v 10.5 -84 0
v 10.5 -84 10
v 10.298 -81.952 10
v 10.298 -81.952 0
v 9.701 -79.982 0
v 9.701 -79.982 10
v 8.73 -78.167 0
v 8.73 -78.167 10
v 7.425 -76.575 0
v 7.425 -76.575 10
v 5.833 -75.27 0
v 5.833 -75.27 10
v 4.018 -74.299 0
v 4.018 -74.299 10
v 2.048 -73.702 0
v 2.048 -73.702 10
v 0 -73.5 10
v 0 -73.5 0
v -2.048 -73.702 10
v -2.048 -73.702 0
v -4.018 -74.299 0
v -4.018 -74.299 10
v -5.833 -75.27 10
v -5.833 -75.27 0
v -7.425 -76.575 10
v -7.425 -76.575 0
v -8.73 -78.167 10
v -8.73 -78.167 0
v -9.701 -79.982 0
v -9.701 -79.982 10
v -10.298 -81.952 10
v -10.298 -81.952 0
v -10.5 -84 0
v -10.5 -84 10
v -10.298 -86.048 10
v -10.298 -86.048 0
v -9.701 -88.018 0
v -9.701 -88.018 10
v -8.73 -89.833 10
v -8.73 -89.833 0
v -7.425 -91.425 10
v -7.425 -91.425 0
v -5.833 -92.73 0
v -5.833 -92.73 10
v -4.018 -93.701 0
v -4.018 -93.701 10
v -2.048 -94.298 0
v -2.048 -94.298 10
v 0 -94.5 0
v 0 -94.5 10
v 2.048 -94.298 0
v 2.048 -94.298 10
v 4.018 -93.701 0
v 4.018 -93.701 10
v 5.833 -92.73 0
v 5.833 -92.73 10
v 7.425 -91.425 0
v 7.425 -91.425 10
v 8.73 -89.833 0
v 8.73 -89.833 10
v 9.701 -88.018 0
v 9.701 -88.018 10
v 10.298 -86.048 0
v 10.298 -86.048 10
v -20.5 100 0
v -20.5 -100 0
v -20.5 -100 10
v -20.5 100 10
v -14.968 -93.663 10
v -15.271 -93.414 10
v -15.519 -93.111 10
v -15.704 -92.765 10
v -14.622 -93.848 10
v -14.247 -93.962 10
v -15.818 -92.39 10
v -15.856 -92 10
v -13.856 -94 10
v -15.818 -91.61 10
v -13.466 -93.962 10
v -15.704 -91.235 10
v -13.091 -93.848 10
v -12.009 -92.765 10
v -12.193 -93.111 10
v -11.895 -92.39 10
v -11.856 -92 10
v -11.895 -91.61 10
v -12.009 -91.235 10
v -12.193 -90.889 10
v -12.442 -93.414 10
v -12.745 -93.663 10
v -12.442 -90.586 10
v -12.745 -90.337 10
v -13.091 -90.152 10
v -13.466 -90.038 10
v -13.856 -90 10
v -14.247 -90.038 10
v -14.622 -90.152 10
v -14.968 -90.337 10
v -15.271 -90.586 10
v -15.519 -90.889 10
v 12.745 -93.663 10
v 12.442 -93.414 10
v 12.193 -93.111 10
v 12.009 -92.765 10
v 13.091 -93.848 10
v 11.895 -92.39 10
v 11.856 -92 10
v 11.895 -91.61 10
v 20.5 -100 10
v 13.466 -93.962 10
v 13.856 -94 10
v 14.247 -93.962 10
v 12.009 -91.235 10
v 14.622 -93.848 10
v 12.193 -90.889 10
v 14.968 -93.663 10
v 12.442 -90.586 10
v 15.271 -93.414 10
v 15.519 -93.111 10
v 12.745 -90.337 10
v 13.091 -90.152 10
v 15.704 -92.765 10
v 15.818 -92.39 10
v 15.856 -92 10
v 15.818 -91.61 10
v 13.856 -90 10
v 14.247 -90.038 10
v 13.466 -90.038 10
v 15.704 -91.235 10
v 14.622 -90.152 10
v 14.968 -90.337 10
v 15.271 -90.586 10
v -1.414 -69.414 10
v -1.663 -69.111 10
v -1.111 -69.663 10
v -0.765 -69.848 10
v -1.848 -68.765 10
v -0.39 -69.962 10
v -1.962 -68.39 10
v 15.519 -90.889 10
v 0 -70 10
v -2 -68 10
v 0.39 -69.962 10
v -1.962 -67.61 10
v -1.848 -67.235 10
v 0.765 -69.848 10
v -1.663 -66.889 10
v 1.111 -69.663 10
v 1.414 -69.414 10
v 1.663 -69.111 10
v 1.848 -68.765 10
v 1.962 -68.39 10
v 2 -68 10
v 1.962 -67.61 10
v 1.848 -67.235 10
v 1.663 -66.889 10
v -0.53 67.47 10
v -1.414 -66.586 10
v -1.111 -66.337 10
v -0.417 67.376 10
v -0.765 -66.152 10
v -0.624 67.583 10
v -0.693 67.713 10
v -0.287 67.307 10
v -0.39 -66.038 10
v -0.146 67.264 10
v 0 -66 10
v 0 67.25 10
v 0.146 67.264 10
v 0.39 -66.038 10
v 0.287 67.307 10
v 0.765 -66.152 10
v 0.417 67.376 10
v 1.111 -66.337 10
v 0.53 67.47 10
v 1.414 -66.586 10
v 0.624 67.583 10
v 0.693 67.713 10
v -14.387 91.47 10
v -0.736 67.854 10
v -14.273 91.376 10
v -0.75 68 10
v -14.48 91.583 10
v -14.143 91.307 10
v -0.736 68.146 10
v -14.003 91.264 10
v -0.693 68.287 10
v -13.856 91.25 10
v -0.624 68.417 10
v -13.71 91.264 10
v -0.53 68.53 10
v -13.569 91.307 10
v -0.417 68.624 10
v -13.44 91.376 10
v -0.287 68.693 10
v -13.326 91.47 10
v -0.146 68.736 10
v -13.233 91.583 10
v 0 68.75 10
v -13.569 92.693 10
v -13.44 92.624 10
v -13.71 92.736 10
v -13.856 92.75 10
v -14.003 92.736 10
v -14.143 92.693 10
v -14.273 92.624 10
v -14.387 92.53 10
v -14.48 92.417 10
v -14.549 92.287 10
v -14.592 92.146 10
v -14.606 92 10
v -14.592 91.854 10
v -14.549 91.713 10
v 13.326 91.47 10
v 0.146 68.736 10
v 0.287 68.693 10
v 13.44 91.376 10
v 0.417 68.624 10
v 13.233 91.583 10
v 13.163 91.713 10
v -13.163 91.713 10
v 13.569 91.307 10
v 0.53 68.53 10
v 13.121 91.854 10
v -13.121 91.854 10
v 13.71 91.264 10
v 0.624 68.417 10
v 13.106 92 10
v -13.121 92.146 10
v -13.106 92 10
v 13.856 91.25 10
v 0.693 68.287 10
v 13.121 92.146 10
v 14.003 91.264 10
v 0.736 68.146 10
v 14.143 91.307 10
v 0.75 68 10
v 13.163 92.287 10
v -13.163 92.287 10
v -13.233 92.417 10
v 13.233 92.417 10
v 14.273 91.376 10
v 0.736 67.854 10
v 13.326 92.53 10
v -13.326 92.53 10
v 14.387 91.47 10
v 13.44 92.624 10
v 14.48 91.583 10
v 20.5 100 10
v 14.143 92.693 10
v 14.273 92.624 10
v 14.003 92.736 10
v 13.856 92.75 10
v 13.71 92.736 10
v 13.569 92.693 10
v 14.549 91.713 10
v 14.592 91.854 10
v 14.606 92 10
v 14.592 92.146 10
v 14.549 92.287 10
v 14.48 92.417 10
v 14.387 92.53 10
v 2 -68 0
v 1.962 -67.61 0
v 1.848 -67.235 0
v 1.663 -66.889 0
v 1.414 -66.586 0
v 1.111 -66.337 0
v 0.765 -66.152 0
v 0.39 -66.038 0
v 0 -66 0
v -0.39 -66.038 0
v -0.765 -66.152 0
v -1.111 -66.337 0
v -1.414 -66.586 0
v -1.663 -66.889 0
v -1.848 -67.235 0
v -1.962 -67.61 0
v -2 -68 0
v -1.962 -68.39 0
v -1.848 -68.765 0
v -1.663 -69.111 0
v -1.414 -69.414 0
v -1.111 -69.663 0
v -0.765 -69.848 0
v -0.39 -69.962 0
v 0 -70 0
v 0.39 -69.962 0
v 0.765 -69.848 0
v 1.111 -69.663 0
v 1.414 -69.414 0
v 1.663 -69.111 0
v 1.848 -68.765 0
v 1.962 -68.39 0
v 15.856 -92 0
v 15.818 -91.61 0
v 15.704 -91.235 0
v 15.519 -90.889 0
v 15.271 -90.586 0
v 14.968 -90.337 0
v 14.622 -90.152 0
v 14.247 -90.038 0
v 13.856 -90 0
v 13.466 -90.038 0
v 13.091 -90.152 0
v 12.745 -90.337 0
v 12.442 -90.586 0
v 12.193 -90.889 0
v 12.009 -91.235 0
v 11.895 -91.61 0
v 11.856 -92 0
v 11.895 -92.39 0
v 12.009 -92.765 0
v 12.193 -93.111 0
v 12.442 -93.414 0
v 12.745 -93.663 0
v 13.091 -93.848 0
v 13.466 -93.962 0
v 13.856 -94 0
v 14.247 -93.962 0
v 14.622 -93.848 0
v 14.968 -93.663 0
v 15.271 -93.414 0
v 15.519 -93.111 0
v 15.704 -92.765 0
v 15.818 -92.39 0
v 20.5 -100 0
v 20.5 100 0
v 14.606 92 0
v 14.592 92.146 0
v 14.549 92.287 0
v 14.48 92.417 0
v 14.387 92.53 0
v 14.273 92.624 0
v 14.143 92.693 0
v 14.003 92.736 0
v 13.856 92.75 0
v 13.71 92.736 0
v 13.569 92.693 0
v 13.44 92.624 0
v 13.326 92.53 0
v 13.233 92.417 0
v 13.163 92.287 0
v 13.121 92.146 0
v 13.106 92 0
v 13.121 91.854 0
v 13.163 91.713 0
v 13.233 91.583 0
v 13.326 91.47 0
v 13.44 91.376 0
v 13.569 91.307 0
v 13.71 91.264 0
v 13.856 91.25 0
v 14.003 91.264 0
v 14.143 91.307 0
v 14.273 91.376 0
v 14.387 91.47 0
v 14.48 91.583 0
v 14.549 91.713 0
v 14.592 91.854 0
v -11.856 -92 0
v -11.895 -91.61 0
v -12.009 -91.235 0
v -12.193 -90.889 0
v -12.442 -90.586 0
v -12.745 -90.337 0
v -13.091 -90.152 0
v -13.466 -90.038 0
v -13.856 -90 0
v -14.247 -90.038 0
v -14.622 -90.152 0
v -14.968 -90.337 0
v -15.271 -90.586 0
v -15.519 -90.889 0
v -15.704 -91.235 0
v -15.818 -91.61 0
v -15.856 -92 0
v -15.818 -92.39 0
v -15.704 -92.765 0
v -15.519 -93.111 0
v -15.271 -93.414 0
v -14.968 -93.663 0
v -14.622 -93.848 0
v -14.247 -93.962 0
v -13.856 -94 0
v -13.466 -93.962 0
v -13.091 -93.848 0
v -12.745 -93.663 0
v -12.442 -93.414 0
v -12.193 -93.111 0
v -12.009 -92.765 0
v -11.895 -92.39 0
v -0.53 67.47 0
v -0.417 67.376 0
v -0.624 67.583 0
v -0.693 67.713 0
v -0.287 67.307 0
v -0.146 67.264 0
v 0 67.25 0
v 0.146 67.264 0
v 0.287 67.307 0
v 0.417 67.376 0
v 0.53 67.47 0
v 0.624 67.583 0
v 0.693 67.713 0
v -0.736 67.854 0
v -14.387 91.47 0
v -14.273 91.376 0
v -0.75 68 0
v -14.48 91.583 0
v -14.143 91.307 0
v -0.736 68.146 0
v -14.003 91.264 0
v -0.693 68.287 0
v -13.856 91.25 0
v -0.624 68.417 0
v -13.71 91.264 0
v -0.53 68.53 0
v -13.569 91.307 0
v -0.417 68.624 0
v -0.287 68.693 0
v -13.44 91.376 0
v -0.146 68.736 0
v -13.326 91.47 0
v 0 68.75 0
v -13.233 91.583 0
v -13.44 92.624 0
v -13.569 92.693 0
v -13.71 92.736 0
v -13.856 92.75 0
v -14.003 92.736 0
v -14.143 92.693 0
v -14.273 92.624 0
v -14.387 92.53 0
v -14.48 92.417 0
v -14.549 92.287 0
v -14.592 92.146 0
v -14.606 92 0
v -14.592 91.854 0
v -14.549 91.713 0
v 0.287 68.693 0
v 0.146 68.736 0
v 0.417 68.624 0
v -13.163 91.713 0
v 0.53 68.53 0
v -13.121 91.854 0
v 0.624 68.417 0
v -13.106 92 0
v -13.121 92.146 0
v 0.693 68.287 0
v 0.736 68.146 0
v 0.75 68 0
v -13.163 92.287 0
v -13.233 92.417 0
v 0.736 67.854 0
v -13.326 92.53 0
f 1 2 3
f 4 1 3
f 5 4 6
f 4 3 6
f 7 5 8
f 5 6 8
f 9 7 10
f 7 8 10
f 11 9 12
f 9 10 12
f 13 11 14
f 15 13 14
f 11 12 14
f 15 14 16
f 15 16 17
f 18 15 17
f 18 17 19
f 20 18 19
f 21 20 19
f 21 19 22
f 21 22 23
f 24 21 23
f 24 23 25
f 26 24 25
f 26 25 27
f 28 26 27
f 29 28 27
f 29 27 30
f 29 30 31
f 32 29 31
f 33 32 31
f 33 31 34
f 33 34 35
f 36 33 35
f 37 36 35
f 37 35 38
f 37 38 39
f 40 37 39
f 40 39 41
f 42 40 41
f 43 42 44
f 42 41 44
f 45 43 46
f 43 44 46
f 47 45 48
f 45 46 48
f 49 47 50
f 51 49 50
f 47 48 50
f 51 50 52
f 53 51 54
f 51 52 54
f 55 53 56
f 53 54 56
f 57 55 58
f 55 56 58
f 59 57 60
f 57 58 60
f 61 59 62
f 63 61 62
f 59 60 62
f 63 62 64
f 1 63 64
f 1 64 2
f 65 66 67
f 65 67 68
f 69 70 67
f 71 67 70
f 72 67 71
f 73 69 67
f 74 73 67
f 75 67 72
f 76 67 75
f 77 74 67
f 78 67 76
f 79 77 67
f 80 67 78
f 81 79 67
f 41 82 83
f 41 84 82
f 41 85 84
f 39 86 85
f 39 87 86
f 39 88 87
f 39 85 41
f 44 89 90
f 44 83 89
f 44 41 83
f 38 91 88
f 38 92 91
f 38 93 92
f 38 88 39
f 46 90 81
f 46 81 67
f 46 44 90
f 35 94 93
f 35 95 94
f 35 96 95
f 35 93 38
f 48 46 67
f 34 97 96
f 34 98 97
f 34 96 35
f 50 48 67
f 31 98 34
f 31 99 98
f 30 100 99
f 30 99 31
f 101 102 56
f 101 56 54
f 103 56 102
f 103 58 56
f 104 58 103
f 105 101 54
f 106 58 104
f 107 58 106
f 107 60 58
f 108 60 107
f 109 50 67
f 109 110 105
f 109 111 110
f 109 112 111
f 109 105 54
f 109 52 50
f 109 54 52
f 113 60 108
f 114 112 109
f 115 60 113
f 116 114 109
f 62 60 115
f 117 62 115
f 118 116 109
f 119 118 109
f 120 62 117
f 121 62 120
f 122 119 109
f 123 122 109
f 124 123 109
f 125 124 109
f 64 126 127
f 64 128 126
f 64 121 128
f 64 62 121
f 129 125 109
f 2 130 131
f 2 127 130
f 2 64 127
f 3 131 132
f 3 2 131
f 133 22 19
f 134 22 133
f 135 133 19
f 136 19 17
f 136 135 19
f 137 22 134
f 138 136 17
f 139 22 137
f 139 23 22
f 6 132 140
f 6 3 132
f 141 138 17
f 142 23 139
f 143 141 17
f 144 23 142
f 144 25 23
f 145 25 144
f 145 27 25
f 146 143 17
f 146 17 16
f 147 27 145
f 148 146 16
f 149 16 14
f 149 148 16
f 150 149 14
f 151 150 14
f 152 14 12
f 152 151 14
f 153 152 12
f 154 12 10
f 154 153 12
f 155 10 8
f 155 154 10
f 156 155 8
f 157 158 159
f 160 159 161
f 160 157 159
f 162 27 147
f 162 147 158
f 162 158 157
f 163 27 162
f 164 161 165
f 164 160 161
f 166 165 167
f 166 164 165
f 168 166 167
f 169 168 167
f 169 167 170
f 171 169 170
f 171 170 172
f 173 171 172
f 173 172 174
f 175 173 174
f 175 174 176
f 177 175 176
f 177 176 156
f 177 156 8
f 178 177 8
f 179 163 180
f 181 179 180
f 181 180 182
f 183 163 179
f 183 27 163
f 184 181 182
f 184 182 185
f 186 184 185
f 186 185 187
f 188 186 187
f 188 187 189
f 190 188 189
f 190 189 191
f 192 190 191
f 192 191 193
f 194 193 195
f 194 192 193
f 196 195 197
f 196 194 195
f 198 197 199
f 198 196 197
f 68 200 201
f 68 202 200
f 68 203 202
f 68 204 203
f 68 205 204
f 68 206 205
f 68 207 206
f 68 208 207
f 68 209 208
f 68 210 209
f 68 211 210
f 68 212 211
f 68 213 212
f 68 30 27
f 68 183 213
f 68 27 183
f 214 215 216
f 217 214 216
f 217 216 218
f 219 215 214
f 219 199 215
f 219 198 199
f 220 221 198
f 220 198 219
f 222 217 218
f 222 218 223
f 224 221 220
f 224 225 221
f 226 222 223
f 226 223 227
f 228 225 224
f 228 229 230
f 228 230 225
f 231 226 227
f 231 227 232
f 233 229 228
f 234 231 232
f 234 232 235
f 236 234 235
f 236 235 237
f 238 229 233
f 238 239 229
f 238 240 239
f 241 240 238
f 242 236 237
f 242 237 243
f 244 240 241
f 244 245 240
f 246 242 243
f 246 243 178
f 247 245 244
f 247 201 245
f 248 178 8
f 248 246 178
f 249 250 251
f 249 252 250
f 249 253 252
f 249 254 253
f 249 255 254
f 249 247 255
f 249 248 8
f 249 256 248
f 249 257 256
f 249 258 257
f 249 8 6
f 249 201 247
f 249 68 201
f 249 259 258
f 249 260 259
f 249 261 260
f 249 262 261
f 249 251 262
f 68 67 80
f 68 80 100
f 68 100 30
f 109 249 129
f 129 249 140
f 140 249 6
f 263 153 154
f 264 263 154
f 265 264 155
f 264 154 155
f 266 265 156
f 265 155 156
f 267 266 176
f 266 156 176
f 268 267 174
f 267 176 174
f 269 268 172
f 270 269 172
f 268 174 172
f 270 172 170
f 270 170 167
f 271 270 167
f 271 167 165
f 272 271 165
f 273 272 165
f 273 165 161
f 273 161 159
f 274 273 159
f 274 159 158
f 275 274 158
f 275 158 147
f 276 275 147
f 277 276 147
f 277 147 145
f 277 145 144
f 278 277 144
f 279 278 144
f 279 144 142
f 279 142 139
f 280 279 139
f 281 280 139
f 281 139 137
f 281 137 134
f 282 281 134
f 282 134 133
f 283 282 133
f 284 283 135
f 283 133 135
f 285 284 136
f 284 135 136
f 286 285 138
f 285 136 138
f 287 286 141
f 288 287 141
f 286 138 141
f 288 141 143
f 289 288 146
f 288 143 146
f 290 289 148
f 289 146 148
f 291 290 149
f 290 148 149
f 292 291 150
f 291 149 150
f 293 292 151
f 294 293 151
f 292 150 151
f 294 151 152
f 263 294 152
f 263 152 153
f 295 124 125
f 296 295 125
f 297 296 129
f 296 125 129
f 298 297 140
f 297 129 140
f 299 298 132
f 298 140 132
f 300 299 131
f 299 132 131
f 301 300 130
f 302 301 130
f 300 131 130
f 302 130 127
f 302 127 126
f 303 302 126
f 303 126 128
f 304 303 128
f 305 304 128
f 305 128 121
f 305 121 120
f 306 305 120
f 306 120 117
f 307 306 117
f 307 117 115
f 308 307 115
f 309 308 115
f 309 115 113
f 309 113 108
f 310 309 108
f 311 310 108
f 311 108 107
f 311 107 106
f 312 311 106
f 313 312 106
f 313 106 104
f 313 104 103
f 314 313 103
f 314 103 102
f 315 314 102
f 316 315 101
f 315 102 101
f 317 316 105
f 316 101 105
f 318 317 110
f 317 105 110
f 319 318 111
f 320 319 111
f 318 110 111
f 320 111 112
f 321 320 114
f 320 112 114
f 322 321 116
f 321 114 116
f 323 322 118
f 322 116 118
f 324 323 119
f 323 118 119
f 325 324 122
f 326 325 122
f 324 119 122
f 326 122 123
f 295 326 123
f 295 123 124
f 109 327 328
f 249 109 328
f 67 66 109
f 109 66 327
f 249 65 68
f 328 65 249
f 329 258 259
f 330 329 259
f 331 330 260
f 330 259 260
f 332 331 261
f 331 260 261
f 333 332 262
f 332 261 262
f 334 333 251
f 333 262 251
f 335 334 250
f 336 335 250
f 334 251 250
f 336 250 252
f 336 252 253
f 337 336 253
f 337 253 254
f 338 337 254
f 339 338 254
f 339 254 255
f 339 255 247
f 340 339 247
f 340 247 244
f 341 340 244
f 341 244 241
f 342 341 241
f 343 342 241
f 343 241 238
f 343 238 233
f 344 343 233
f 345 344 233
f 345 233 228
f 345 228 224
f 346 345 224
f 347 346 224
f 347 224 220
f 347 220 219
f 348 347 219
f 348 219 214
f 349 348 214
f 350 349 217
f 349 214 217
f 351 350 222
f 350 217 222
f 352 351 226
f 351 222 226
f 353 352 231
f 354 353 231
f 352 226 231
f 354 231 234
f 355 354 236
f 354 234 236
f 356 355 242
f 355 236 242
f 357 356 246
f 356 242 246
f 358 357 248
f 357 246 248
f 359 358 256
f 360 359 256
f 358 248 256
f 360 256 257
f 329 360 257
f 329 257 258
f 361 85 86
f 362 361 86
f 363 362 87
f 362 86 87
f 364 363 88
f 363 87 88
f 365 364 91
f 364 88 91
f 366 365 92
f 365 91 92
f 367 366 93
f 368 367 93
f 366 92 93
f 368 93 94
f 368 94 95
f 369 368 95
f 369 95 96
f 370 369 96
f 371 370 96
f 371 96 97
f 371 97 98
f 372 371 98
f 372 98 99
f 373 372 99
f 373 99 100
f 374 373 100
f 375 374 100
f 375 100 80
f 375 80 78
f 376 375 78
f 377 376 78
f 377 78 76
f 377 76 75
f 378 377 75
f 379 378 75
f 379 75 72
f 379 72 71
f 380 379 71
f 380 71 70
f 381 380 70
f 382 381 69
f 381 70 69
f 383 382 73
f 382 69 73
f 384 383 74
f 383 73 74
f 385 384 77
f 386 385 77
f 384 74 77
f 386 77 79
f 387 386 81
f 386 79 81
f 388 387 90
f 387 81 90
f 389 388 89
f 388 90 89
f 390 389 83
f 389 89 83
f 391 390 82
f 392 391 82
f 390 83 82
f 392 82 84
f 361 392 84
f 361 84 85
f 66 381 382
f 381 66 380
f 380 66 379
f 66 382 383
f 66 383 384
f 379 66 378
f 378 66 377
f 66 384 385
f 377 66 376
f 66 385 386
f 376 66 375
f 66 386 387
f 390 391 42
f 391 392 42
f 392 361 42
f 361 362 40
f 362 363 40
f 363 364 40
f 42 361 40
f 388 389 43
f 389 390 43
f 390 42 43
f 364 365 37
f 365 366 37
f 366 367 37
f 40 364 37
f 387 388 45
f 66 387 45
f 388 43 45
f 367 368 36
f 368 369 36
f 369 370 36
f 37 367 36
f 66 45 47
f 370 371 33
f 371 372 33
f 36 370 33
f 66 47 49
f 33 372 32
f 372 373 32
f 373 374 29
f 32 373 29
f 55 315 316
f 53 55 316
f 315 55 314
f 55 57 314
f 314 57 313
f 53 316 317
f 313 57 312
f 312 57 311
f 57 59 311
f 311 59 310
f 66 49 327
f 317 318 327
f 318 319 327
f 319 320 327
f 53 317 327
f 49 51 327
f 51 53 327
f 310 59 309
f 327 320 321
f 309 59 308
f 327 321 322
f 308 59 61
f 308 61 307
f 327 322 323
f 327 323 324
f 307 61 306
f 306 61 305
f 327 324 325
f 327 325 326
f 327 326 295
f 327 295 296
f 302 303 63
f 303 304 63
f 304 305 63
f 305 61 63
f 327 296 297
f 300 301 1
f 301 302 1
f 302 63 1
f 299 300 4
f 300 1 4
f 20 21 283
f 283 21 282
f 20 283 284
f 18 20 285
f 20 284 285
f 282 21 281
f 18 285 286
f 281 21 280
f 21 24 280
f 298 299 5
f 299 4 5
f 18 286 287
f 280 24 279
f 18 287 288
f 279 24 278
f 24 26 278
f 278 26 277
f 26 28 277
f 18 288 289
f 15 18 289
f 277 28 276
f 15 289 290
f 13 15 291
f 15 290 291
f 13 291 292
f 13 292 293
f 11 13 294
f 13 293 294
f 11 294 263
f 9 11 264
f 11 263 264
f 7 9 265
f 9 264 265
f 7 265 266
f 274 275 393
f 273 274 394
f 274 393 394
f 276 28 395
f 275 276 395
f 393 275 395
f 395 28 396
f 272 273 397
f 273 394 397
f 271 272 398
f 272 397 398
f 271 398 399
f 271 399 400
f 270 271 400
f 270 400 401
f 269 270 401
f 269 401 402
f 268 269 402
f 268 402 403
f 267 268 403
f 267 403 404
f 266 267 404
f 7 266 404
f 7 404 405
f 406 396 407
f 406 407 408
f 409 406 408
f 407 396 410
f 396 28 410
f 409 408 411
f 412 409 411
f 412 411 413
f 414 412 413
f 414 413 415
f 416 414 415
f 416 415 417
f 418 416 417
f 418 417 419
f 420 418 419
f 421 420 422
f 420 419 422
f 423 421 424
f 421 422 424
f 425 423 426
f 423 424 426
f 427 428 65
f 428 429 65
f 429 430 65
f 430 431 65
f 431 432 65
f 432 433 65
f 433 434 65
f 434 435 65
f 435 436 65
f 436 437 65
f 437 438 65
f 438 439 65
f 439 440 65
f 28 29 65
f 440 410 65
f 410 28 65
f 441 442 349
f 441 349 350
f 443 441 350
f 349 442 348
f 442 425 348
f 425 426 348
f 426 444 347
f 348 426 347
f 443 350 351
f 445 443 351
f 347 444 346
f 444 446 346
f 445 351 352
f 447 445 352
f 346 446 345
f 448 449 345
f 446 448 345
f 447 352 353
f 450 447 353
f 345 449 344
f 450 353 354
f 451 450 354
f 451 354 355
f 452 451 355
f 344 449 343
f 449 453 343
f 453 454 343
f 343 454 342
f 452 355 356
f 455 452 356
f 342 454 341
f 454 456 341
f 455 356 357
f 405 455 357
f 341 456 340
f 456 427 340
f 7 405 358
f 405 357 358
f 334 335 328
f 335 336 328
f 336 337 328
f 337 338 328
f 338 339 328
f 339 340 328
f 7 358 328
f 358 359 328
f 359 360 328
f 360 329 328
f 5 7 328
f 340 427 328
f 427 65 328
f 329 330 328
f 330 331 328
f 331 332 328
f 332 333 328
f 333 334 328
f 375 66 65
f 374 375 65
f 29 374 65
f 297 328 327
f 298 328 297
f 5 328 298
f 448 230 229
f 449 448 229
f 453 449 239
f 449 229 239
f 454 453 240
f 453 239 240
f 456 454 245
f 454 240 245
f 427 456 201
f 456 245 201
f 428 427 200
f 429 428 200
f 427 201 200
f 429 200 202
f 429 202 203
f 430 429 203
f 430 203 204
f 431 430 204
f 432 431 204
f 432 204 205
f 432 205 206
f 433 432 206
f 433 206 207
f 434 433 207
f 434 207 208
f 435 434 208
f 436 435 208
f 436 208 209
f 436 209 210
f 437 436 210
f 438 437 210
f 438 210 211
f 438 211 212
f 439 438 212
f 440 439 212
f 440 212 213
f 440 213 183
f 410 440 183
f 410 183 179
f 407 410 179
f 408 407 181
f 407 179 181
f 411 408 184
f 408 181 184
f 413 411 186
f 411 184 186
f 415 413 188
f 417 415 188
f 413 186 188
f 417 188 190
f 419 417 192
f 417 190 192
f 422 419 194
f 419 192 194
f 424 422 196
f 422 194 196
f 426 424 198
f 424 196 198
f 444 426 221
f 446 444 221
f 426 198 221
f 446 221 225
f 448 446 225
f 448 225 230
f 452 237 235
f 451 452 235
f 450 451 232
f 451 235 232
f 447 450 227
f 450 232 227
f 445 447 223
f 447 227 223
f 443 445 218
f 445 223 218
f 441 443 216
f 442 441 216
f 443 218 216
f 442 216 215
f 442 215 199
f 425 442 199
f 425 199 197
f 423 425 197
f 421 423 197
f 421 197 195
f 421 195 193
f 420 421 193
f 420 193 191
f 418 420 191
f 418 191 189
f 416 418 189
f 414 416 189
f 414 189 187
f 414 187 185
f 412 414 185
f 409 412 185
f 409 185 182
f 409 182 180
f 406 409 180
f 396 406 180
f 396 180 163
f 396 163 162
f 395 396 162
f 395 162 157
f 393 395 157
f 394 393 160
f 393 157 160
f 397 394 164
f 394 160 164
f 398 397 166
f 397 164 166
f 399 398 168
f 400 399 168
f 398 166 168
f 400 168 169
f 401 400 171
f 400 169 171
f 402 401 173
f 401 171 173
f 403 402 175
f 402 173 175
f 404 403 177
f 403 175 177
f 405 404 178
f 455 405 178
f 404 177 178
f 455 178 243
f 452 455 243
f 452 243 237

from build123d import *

# Parameters (mm, degrees)
F0_W     = 41
F0_H     = 200
F1_DEPTH = 10
F2_R     = 2
F2_R_2   = 0.75
F2_R_3   = 10.5
F3_DEPTH = 25
F4_DEPTH = 25


with BuildPart() as f1:
    # F0 (on Top) → F1 (new body)
    with BuildSketch(Plane.XY):
        Rectangle(F0_W, F0_H)
    extrude(amount=F1_DEPTH)

    # F2 (on face) → F3 (cut)
    with BuildSketch(Plane.XY.offset(10)):
        with Locations((0, -68)):
            Circle(F2_R)
        with Locations((-13.856406, -92)):
            Circle(F2_R)
        with Locations((13.856406, -92)):
            Circle(F2_R)
        with Locations((0, 68)):
            Circle(F2_R_2)
        with Locations((-13.856406, 92)):
            Circle(F2_R_2)
        with Locations((13.856406, 92)):
            Circle(F2_R_2)
        with Locations((0, -84)):
            Circle(F2_R_3)
    extrude(amount=-F3_DEPTH, mode=Mode.SUBTRACT)

    # F2 (on face) → F4 (cut)
    with BuildSketch(Plane.XY.offset(10)):
        with Locations((0, -68)):
            Circle(F2_R)
        with Locations((-13.856406, -92)):
            Circle(F2_R)
        with Locations((13.856406, -92)):
            Circle(F2_R)
        with Locations((0, 68)):
            Circle(F2_R_2)
        with Locations((-13.856406, 92)):
            Circle(F2_R_2)
        with Locations((13.856406, 92)):
            Circle(F2_R_2)
        with Locations((0, -84)):
            Circle(F2_R_3)
    extrude(amount=-F4_DEPTH, mode=Mode.SUBTRACT)


solid = f1.part
